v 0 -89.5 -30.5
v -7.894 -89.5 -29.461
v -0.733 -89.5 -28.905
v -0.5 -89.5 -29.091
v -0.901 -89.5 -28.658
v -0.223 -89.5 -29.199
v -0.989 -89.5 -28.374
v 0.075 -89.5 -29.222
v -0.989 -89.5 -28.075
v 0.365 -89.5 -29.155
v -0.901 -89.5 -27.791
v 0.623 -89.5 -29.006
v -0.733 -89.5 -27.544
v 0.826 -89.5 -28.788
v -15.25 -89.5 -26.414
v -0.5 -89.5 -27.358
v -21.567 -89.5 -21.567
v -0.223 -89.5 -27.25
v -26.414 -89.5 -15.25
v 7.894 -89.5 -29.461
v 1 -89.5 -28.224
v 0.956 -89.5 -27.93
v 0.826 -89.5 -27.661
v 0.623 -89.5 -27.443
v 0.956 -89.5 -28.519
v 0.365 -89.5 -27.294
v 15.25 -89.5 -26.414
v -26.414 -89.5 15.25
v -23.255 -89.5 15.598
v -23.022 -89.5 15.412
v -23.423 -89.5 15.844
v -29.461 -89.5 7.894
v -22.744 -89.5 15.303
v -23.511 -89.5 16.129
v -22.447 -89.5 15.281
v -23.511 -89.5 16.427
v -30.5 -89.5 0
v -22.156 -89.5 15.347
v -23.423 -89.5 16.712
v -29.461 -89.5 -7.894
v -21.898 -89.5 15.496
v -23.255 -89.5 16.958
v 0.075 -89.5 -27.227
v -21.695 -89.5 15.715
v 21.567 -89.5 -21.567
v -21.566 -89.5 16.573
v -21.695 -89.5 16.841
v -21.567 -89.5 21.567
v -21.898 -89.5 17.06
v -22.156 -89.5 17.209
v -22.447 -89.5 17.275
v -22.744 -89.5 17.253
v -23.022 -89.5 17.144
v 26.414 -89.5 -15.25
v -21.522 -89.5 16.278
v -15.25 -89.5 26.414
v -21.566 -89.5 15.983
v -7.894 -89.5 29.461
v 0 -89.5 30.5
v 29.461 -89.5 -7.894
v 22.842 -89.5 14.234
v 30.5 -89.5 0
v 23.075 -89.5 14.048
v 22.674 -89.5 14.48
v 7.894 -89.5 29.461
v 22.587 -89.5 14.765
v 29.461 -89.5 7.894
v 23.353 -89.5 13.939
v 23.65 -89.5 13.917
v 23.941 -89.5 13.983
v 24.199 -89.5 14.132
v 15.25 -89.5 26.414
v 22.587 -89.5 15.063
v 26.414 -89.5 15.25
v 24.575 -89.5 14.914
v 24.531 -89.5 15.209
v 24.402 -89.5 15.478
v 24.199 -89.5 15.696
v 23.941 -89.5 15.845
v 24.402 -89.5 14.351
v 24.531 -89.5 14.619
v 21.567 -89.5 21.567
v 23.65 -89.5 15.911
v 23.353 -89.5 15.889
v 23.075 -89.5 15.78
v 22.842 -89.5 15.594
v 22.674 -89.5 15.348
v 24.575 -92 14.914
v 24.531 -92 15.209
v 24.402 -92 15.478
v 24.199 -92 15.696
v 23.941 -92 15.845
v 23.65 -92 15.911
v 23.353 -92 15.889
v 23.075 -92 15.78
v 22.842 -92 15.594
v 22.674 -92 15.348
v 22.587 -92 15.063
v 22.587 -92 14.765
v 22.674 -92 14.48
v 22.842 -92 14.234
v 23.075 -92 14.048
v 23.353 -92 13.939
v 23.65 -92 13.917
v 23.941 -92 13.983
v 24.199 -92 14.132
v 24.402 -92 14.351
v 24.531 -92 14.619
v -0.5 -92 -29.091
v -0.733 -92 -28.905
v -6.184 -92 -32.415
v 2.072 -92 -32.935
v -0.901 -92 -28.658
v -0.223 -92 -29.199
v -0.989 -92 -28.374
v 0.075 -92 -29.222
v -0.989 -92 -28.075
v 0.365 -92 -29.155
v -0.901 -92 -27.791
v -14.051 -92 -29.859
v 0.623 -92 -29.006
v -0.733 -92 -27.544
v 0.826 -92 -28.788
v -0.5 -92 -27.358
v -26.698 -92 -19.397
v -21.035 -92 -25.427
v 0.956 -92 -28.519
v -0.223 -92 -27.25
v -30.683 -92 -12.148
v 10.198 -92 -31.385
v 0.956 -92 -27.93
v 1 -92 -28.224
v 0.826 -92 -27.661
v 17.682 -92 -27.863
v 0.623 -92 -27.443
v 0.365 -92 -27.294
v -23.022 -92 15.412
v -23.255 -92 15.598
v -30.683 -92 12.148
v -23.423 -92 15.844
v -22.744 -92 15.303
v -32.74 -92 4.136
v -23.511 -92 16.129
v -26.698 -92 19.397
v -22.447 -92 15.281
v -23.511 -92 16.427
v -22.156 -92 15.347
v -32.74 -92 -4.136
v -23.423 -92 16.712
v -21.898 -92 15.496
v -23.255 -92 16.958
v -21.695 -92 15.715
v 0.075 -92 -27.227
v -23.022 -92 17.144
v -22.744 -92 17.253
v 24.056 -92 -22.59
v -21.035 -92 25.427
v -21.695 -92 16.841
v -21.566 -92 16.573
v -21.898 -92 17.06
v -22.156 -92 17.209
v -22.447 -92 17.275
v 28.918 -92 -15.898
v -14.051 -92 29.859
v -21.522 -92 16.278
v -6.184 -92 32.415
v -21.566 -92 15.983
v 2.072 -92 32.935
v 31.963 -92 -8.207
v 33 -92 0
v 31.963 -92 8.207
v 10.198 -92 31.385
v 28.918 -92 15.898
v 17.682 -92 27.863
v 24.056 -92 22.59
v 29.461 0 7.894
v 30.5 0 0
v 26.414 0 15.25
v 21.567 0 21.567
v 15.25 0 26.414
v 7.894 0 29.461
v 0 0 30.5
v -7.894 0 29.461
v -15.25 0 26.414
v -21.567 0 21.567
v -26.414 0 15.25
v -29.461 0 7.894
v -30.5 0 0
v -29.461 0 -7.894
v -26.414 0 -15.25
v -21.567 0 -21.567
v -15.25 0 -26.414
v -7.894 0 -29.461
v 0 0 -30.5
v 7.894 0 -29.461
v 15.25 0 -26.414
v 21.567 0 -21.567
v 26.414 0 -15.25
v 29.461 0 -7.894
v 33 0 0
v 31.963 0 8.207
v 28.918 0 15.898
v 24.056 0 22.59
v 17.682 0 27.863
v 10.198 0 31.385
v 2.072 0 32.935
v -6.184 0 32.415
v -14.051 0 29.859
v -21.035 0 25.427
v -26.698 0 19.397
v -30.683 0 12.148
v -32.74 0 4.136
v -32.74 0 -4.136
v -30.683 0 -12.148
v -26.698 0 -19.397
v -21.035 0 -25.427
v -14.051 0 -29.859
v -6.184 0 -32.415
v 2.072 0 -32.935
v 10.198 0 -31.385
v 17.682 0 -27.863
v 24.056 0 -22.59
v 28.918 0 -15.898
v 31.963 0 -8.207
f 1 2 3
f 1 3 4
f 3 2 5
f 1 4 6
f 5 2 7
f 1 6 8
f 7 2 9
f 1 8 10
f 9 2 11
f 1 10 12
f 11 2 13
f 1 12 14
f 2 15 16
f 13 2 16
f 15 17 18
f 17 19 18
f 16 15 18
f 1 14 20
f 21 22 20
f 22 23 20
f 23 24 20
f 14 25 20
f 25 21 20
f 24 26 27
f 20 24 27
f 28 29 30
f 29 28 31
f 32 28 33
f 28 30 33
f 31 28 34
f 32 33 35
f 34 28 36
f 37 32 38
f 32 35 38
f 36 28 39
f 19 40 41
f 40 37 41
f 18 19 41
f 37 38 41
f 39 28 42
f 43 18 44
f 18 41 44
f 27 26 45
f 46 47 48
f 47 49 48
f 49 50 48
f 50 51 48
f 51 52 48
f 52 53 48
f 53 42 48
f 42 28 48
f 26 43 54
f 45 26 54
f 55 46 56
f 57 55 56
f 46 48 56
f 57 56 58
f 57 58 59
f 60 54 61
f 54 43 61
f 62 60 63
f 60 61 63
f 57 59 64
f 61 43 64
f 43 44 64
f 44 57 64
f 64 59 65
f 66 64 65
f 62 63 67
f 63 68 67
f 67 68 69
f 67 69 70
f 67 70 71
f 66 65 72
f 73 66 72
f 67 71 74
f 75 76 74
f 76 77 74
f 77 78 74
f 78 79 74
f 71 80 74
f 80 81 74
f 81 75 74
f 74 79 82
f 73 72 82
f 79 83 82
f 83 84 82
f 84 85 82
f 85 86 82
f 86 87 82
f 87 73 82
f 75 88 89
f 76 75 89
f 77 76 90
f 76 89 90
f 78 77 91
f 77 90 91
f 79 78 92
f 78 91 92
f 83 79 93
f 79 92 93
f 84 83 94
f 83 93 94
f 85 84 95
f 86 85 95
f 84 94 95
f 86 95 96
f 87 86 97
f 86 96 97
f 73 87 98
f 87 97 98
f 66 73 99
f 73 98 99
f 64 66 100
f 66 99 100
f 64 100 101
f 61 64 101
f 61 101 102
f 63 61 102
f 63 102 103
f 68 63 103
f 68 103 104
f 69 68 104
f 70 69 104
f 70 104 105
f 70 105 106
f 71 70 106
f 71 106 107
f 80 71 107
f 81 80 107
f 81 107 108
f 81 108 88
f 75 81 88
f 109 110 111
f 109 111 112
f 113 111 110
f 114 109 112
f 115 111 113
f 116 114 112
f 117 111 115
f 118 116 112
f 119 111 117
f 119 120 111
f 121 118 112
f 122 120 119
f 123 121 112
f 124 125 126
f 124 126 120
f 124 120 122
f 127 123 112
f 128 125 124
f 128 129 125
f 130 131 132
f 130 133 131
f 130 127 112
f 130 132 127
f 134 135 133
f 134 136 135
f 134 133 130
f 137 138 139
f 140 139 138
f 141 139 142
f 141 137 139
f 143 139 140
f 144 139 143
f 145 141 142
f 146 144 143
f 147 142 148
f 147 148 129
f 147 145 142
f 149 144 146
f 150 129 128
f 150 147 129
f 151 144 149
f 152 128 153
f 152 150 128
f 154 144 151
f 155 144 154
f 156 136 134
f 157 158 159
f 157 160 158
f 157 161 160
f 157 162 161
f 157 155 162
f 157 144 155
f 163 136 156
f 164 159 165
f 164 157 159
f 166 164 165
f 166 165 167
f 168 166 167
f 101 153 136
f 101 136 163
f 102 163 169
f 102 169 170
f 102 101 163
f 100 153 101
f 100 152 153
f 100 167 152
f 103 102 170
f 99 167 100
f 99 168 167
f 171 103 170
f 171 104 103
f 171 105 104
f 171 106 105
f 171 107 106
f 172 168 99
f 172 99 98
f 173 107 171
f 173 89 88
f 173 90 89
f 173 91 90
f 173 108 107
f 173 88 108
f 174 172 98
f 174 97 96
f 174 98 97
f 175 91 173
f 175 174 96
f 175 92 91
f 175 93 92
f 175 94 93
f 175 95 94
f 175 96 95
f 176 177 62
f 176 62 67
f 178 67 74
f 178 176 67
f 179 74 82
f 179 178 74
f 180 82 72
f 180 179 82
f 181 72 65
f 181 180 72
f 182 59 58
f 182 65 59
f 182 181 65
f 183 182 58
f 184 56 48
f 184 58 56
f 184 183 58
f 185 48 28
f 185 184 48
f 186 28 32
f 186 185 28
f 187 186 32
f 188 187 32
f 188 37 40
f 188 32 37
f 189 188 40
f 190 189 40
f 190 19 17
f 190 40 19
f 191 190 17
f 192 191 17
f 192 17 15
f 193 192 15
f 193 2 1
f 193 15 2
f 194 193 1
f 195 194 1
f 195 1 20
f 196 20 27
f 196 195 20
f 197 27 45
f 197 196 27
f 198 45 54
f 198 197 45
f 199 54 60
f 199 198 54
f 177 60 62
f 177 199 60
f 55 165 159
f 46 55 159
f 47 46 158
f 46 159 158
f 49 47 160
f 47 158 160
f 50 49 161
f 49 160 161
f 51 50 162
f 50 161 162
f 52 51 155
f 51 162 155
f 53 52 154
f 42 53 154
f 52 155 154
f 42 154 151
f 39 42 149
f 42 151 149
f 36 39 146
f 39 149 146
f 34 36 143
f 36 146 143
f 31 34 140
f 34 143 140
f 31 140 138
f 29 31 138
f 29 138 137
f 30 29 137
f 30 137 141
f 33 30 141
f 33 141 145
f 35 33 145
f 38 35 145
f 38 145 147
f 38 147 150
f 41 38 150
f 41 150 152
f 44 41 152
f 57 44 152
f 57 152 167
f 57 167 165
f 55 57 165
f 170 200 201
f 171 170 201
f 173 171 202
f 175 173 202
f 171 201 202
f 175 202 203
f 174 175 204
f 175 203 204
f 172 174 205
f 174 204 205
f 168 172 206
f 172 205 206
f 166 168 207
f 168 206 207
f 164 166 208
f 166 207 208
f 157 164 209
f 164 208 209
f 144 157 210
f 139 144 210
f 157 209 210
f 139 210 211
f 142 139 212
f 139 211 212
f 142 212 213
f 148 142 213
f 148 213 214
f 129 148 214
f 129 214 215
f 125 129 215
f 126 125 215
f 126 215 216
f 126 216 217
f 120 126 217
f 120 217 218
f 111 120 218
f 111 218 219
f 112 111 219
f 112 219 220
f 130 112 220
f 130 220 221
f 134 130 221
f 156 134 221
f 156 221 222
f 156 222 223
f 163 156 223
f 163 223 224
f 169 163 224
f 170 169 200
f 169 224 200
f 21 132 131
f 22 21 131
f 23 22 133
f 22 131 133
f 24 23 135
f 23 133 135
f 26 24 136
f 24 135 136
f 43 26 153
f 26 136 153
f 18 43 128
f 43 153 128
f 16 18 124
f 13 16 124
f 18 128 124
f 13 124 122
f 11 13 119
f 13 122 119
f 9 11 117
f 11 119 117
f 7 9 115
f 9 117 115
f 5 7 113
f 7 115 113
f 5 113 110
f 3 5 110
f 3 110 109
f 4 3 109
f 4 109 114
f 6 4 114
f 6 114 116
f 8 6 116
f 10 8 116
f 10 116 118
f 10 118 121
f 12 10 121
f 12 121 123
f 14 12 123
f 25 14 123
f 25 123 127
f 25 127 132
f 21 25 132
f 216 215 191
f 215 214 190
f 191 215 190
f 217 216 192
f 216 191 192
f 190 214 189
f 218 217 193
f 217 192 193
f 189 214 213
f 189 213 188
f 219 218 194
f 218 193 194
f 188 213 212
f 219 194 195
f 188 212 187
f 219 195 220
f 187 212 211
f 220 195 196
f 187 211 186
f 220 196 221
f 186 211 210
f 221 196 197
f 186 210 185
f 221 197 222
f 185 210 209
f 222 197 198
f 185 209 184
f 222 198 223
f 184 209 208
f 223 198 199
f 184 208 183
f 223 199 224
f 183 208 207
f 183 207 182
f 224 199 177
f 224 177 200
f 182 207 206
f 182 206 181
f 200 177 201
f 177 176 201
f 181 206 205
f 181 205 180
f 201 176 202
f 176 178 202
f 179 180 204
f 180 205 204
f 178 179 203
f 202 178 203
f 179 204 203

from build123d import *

# Parameters (mm, degrees)
F0_R     = 33
F0_R_2   = 30
F1_DEPTH = 92
F2_DEPTH = 3
F3_T     = -2.5
F4_R     = 1
F5_DEPTH = 6


with BuildPart() as f1:
    # F0 (on Front) → F1 (new body)
    with BuildSketch(Plane.XZ):
        Circle(F0_R)
        Circle(F0_R_2, mode=Mode.SUBTRACT)
        Circle(F0_R_2)
    extrude(amount=F1_DEPTH)

    # F0 (on Front) → F2 (join)
    with BuildSketch(Plane.XZ):
        Circle(F0_R)
        Circle(F0_R_2, mode=Mode.SUBTRACT)
    extrude(amount=F2_DEPTH)

    # F3
    f3_openings = [f1.faces().sort_by_distance(p)[0] for p in [
        (0, 0, 0),
    ]]
    offset(amount=F3_T, openings=f3_openings)

    # F4 (on face) → F5 (cut)
    with BuildSketch(Plane.XZ.offset(92)):
        with Locations((0, -28.224484995)):
            Circle(F4_R)
        with Locations((23.5754325986, 14.9141801521)):
            Circle(F4_R)
        with Locations((-22.5217076706, 16.2781162705)):
            Circle(F4_R)
    extrude(amount=-F5_DEPTH, mode=Mode.SUBTRACT)


solid = f1.part
